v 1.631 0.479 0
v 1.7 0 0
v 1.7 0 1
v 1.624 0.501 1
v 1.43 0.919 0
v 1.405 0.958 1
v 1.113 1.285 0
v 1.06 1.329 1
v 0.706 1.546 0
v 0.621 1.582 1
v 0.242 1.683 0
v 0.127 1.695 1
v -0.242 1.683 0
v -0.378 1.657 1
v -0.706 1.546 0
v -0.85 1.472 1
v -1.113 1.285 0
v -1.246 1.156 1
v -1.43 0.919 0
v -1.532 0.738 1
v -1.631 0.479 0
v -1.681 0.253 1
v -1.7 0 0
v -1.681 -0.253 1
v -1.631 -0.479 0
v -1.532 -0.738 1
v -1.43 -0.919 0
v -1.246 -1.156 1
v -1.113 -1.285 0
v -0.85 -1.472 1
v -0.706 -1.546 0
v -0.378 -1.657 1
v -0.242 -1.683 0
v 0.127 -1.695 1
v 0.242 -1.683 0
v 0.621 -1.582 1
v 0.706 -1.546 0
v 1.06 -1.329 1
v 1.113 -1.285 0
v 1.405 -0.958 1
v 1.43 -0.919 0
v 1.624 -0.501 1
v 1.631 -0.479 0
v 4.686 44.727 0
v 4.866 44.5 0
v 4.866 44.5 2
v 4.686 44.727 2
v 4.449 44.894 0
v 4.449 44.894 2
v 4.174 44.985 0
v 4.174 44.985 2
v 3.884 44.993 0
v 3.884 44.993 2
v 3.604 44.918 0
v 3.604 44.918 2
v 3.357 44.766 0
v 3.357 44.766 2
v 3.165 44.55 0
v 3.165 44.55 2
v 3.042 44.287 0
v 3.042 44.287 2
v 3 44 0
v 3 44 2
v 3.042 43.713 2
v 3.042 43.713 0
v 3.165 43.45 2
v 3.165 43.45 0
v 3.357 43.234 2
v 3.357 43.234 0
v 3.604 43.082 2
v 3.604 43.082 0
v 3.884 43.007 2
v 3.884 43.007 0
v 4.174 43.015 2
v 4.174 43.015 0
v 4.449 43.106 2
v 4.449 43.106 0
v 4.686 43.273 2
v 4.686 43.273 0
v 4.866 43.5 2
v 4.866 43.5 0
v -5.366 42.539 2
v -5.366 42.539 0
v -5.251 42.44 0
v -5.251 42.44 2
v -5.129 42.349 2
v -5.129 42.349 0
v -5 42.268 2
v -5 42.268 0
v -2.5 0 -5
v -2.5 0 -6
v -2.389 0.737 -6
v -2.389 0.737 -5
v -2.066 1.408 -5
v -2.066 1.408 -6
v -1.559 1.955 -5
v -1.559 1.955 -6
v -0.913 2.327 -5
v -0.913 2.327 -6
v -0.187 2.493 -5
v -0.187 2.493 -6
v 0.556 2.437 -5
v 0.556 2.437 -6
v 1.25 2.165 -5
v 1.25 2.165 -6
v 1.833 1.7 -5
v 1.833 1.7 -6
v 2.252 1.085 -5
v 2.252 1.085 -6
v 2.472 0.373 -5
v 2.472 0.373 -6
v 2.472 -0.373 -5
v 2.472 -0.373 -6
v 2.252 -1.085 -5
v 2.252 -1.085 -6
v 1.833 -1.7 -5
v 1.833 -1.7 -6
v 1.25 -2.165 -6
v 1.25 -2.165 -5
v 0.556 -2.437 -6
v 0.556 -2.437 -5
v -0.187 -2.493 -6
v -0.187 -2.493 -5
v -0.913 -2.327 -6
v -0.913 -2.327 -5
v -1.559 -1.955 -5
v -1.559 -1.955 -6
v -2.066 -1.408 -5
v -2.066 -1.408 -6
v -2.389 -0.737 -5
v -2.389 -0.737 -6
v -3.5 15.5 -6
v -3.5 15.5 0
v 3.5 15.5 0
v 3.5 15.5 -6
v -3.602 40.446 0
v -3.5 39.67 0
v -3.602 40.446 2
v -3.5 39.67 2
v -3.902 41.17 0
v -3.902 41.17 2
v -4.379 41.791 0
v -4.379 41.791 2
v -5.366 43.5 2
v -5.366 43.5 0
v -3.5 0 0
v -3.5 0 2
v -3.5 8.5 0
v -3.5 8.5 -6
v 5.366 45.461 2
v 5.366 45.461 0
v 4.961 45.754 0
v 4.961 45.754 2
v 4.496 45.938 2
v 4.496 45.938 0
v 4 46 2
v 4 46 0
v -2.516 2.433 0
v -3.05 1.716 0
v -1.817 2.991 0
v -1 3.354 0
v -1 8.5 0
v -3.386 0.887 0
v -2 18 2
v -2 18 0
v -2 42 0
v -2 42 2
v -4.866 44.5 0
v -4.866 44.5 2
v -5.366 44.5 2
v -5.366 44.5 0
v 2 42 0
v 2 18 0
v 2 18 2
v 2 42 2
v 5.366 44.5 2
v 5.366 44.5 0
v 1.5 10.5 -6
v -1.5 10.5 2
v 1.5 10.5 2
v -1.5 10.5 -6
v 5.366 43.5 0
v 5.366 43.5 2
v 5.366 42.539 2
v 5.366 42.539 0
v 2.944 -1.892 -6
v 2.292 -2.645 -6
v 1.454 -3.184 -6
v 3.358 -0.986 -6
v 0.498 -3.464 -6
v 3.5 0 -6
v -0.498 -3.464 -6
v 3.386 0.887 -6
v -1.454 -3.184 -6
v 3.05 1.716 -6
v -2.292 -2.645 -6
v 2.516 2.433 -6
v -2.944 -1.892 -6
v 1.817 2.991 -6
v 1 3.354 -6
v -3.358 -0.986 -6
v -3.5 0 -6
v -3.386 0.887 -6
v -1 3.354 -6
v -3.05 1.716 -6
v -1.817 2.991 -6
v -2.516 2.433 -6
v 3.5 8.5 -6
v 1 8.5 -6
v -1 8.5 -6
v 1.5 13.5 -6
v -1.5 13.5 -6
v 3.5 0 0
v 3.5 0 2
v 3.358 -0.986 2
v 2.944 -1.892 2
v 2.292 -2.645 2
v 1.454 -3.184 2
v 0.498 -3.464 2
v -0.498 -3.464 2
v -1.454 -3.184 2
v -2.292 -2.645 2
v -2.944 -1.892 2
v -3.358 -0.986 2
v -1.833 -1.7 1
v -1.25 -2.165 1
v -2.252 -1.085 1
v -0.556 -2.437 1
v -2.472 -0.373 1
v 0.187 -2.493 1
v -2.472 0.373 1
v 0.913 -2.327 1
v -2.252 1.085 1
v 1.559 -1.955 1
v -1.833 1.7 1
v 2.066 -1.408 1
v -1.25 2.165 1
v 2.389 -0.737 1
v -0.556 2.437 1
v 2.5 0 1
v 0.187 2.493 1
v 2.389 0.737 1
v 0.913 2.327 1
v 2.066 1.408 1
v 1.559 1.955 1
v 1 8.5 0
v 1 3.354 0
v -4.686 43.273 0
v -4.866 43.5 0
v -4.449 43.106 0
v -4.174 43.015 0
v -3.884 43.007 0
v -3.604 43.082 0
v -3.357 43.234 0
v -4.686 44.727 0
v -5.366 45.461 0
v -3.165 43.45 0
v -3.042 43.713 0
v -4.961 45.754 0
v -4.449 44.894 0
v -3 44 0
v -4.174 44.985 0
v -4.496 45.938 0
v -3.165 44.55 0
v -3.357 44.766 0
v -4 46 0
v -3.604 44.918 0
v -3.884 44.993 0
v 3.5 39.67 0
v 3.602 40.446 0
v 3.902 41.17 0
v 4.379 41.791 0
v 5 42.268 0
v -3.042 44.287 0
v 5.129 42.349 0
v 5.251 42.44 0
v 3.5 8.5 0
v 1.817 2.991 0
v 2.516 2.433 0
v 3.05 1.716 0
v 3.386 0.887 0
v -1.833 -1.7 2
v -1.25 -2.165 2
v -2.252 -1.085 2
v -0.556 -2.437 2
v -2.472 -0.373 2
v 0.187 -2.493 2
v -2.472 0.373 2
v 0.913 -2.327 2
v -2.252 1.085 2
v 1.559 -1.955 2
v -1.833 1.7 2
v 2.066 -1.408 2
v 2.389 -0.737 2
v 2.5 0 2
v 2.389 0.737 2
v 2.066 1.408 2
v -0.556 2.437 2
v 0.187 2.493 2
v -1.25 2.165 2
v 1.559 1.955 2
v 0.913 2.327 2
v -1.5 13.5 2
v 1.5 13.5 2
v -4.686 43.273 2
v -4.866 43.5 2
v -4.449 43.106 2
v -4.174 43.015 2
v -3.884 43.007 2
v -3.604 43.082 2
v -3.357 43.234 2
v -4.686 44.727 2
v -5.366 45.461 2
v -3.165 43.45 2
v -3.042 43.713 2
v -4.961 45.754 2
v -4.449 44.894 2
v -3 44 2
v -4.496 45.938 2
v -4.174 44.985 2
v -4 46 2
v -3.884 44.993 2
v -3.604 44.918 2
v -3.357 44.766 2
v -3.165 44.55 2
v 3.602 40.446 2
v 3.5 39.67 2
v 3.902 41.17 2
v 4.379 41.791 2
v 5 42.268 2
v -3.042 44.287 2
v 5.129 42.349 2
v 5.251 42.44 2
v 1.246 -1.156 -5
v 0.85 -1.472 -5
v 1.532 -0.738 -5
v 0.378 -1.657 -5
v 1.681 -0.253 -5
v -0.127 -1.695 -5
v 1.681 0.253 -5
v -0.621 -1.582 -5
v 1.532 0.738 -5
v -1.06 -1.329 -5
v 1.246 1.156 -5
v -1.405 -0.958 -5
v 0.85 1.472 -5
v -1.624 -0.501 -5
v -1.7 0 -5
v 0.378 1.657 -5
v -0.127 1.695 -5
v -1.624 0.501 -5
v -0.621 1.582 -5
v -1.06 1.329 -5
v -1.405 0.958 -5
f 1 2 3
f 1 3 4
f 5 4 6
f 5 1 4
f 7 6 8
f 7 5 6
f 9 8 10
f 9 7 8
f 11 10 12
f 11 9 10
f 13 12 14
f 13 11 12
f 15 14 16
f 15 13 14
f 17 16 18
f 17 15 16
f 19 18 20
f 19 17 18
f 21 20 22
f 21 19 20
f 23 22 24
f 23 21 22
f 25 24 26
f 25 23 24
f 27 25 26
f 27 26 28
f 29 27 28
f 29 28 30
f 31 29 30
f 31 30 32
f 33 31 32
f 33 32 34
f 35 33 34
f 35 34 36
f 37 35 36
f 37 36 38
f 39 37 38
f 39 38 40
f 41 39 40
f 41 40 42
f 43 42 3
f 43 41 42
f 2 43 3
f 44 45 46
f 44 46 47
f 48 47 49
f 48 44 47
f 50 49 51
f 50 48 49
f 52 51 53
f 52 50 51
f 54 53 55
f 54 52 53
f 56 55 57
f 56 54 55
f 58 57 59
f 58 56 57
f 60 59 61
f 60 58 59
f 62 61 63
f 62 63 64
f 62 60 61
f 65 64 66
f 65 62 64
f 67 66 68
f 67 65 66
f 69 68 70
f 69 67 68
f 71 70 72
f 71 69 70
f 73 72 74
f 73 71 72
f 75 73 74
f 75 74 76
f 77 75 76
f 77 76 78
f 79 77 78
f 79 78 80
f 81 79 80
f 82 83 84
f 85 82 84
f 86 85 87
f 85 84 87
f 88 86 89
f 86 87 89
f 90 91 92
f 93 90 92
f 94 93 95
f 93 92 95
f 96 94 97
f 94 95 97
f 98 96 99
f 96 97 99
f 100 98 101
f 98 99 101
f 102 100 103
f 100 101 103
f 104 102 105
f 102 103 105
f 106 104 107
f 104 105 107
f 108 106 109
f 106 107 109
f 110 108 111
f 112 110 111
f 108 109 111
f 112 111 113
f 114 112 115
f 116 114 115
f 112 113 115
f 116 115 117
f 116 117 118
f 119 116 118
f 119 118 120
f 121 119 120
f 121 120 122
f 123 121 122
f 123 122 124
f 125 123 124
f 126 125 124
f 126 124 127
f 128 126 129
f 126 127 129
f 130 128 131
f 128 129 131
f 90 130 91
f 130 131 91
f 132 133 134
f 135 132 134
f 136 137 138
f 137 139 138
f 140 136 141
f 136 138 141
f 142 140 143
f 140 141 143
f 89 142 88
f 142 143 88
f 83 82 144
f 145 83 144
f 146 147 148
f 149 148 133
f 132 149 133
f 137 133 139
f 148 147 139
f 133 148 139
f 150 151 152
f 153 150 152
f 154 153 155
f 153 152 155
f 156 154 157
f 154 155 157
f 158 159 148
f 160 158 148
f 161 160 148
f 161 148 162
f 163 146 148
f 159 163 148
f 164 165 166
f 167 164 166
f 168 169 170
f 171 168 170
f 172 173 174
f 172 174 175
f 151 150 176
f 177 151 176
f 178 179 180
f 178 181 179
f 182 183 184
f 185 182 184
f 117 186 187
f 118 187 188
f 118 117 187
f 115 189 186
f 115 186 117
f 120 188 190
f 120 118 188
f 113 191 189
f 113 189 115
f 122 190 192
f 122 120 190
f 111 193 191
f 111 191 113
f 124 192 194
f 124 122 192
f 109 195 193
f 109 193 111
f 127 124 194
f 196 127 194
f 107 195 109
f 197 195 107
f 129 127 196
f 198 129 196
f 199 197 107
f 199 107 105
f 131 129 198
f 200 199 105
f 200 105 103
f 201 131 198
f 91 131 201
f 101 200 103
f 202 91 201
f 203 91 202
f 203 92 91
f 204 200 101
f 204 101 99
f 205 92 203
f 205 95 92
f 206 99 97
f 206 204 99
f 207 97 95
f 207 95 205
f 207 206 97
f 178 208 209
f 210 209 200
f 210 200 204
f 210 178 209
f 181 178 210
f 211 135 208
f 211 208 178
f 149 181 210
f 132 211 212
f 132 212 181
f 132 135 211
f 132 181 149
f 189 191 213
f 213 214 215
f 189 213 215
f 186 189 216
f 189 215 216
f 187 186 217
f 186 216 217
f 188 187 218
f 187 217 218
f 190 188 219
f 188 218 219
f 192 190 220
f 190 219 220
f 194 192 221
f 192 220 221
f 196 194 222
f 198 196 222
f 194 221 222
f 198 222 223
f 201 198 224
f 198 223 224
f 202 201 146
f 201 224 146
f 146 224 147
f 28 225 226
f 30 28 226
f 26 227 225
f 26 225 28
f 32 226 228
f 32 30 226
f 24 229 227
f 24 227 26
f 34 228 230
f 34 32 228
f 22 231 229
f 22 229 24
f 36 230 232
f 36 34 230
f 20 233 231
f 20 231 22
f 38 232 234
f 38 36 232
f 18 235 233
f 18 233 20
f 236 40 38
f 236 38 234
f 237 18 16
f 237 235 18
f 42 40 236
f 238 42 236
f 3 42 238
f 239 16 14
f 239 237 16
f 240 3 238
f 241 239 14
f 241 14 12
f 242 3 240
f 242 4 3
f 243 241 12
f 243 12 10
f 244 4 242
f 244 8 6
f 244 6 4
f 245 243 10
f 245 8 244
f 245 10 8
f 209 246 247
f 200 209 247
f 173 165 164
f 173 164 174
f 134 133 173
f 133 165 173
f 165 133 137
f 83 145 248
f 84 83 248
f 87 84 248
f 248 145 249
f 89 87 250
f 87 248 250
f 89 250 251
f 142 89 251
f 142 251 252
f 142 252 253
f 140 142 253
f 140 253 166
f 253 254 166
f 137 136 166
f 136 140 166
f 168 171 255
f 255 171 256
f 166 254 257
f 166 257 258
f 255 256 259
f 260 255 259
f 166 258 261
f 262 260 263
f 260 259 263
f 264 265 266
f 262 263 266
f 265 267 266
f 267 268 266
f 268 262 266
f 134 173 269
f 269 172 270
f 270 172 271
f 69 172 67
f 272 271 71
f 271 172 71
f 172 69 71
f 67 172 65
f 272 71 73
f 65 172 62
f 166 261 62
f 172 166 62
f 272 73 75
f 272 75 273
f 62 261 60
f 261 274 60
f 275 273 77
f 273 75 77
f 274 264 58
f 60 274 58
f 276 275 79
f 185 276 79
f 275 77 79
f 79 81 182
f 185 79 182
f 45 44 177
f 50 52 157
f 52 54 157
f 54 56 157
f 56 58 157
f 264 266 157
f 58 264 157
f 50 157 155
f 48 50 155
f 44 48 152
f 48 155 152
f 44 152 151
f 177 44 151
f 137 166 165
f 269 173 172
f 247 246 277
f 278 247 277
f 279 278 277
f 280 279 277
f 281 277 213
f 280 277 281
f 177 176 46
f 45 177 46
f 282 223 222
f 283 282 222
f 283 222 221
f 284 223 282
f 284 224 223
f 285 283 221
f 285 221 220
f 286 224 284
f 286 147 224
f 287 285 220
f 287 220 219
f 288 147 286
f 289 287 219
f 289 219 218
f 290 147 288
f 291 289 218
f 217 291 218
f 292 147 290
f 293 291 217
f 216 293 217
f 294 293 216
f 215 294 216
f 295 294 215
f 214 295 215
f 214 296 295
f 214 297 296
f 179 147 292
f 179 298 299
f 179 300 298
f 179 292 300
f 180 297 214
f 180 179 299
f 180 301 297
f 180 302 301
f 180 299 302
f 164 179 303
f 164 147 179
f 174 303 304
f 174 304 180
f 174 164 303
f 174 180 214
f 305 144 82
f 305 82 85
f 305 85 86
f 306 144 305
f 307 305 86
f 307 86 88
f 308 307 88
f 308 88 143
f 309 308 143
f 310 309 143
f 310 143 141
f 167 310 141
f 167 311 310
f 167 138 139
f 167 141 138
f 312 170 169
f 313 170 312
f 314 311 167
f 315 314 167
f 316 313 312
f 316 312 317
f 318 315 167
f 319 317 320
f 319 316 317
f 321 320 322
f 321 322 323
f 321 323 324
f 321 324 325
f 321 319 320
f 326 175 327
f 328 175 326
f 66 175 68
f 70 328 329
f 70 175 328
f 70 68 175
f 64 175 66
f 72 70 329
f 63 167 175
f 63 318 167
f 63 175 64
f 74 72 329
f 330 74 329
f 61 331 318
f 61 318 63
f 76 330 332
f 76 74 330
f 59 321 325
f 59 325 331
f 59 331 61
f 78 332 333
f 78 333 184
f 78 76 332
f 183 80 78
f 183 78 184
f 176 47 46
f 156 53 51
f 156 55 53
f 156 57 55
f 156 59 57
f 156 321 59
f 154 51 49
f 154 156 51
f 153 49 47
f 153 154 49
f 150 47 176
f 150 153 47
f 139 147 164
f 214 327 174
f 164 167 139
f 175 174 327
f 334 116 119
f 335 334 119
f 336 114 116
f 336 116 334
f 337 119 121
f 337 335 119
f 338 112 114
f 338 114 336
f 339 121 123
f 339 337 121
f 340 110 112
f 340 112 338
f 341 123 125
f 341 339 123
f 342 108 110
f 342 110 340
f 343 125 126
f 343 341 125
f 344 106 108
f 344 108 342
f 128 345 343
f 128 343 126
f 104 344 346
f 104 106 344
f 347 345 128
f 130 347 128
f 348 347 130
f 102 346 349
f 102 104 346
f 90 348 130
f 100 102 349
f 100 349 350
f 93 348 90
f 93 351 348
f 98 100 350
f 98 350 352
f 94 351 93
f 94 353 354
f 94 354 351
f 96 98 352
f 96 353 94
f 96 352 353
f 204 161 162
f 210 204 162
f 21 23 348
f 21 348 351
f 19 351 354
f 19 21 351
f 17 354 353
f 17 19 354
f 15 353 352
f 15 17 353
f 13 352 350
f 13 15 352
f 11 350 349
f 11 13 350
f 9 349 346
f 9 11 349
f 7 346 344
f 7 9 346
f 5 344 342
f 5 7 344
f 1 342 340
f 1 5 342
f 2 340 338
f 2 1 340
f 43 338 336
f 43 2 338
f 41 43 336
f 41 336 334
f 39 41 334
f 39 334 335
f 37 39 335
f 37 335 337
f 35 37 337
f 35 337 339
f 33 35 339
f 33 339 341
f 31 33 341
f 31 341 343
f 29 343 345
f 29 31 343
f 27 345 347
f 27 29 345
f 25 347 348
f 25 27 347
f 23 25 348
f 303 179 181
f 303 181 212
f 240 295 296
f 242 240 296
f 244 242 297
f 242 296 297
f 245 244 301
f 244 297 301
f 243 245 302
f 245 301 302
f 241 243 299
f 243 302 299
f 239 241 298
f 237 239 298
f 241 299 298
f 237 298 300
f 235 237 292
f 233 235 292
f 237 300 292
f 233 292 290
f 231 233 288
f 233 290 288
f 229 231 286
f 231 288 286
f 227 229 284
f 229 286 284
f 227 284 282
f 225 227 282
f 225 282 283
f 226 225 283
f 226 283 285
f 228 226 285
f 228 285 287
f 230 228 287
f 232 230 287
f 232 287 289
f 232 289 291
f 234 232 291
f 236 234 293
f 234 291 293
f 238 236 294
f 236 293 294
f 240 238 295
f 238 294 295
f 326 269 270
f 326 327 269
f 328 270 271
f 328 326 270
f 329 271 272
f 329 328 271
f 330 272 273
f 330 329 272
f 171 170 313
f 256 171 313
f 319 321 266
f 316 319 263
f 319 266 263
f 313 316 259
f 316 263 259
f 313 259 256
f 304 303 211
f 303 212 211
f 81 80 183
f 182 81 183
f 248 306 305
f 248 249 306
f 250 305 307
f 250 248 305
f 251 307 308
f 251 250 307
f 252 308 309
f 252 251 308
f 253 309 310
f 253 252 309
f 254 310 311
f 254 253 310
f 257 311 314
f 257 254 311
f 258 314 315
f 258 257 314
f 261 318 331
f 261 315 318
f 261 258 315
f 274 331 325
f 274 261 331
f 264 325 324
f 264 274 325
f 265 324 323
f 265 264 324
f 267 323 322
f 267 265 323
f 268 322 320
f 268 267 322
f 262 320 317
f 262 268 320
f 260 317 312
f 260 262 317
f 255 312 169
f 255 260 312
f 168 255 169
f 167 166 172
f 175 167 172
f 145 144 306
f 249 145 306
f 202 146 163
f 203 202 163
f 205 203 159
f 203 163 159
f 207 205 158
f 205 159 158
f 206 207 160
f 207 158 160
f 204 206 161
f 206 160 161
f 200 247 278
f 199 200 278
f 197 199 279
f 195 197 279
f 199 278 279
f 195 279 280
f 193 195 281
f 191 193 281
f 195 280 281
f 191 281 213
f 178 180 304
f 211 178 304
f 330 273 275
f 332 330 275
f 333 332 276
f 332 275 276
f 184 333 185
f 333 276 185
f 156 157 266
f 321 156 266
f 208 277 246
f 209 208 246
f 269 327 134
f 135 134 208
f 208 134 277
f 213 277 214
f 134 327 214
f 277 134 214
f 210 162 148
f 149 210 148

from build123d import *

# Parameters (mm, degrees)
SKETCH_1_R          = 1.7
SKETCH_1_R_2        = 1
SKETCH_1_W          = 4
SKETCH_1_H          = 24
SKETCH_1_W_2        = 3
SKETCH_1_H_2        = 3
EXTRUDE_1_DEPTH     = 2
SKETCH_2_W          = 3
SKETCH_2_H          = 3
SKETCH_2_R          = 1.7
EXTRUDE_2_DEPTH     = 6
FILLET_2_R          = 3
SKETCH_4_R          = 2.5
CUT_EXTRUDE_2_DEPTH = 1
SKETCH_5_R          = 2.5
CUT_EXTRUDE_3_DEPTH = 1
CUT_EXTRUDE_4_DEPTH = 10


with BuildPart() as part:
    # 草图1 → 凸台-拉伸1 (new body)
    with BuildSketch(Plane.XY):
        with BuildLine():
            Line((4, 46), (-4, 46))
            ThreePointArc((-4, 46), (-5.984059393, 43.747991415), (-3.5, 42.063508327))
            Line((-3.5, 42.063508327), (-3.5, 42))
            Line((-3.5, 42), (-3.5, 0))
            ThreePointArc((-3.5, 0), (0, -3.5), (3.5, 0))
            Line((3.5, 0), (3.5, 42))
            Line((3.5, 42), (3.5, 42.063508327))
            ThreePointArc((3.5, 42.063508327), (5.984059393, 43.747991415), (4, 46))
        make_face()
        Circle(SKETCH_1_R, mode=Mode.SUBTRACT)
        with Locations((-4, 44)):
            Circle(SKETCH_1_R_2, mode=Mode.SUBTRACT)
        with Locations((4, 44)):
            Circle(SKETCH_1_R_2, mode=Mode.SUBTRACT)
        with Locations((0, 30)):
            Rectangle(SKETCH_1_W, SKETCH_1_H, mode=Mode.SUBTRACT)
        with Locations((0, 12)):
            Rectangle(SKETCH_1_W_2, SKETCH_1_H_2, mode=Mode.SUBTRACT)
    extrude(amount=EXTRUDE_1_DEPTH)

    # 草图2 → 凸台-拉伸2 (add)
    with BuildSketch(Plane(origin=(0, 0, 0), x_dir=(-1, 0, 0), z_dir=(0, 0, -1))):
        Polygon((3.5, 15.5), (-3.5, 15.5), (-3.5, 8.5), (-1, 8.5), (1, 8.5), (3.5, 8.5), align=None)
        with Locations((0, 12)):
            Rectangle(SKETCH_2_W, SKETCH_2_H, mode=Mode.SUBTRACT)
        with BuildLine():
            Line((1, 8.5), (-1, 8.5))
            Line((-1, 8.5), (-1, 3.354101966))
            ThreePointArc((-1, 3.354101966), (0, 3.5), (1, 3.354101966))
            Line((1, 3.354101966), (1, 8.5))
        make_face()
        with BuildLine():
            ThreePointArc((-1, 3.354101966), (-2.80624304, 2.091650066), (-3.5, 0))
            ThreePointArc((-3.5, 0), (0, -3.5), (3.5, 0))
            ThreePointArc((3.5, 0), (2.80624304, 2.091650066), (1, 3.354101966))
            ThreePointArc((1, 3.354101966), (0, 3.5), (-1, 3.354101966))
        make_face()
        Circle(SKETCH_2_R, mode=Mode.SUBTRACT)
    extrude(amount=EXTRUDE_2_DEPTH)

    # 圆角2
    fillet_2_edges = [part.edges().sort_by_distance(p)[0] for p in [
        (3.5, 42.063508327, 1),
        (-3.5, 42.063508327, 1),
    ]]
    fillet(fillet_2_edges, radius=FILLET_2_R)

    # 草图4 → 切除-拉伸2 (cut)
    with BuildSketch(Plane.XY.offset(2)):
        Circle(SKETCH_4_R)
    extrude(amount=-CUT_EXTRUDE_2_DEPTH, mode=Mode.SUBTRACT)

    # 草图5 → 切除-拉伸3 (cut)
    with BuildSketch(Plane(origin=(0, 0, -6), x_dir=(-1, 0, 0), z_dir=(0, 0, -1))):
        Circle(SKETCH_5_R)
    extrude(amount=-CUT_EXTRUDE_3_DEPTH, mode=Mode.SUBTRACT)

    # 草图3 → 切除-拉伸4 (cut)
    with BuildSketch(Plane.XY.offset(2)):
        with BuildLine():
            Line((-5.366025404, 44.5), (-5.366025404, 43.5))
            Line((-5.366025404, 43.5), (-4.866025404, 43.5))
            ThreePointArc((-4.866025404, 43.5), (-5, 44), (-4.866025404, 44.5))
            Line((-4.866025404, 44.5), (-5.366025404, 44.5))
        make_face()
        with BuildLine():
            ThreePointArc((-5.936491673, 44.5), (-6, 44), (-5.936491673, 43.5))
            Line((-5.936491673, 43.5), (-5.366025404, 43.5))
            Line((-5.366025404, 43.5), (-5.366025404, 44.5))
            Line((-5.366025404, 44.5), (-5.936491673, 44.5))
        make_face()
        with BuildLine():
            ThreePointArc((-5.366025404, 45.460812992), (-5.719722408, 45.021055747), (-5.936491673, 44.5))
            Line((-5.936491673, 44.5), (-5.366025404, 44.5))
            Line((-5.366025404, 44.5), (-5.366025404, 45.460812992))
        make_face()
        with BuildLine():
            Line((-5.366025404, 43.5), (-5.936491673, 43.5))
            ThreePointArc((-5.936491673, 43.5), (-5.719722408, 42.978944253), (-5.366025404, 42.539187008))
            Line((-5.366025404, 42.539187008), (-5.366025404, 43.5))
        make_face()
        with BuildLine():
            ThreePointArc((5.936491673, 43.5), (6, 44), (5.936491673, 44.5))
            Line((5.936491673, 44.5), (5.366025404, 44.5))
            Line((5.366025404, 44.5), (5.366025404, 43.5))
            Line((5.366025404, 43.5), (5.936491673, 43.5))
        make_face()
        with BuildLine():
            Line((5.366025404, 44.5), (5.936491673, 44.5))
            ThreePointArc((5.936491673, 44.5), (5.719722408, 45.021055747), (5.366025404, 45.460812992))
            Line((5.366025404, 45.460812992), (5.366025404, 44.5))
        make_face()
        with BuildLine():
            Line((5.366025404, 43.5), (5.366025404, 44.5))
            Line((5.366025404, 44.5), (4.866025404, 44.5))
            ThreePointArc((4.866025404, 44.5), (4.965925826, 44.258819045), (5, 44))
            ThreePointArc((5, 44), (4.965925826, 43.741180955), (4.866025404, 43.5))
            Line((4.866025404, 43.5), (5.366025404, 43.5))
        make_face()
        with BuildLine():
            ThreePointArc((5.366025404, 42.539187008), (5.719722408, 42.978944253), (5.936491673, 43.5))
            Line((5.936491673, 43.5), (5.366025404, 43.5))
            Line((5.366025404, 43.5), (5.366025404, 42.539187008))
        make_face()
    extrude(amount=-CUT_EXTRUDE_4_DEPTH, mode=Mode.SUBTRACT)


solid = part.part
